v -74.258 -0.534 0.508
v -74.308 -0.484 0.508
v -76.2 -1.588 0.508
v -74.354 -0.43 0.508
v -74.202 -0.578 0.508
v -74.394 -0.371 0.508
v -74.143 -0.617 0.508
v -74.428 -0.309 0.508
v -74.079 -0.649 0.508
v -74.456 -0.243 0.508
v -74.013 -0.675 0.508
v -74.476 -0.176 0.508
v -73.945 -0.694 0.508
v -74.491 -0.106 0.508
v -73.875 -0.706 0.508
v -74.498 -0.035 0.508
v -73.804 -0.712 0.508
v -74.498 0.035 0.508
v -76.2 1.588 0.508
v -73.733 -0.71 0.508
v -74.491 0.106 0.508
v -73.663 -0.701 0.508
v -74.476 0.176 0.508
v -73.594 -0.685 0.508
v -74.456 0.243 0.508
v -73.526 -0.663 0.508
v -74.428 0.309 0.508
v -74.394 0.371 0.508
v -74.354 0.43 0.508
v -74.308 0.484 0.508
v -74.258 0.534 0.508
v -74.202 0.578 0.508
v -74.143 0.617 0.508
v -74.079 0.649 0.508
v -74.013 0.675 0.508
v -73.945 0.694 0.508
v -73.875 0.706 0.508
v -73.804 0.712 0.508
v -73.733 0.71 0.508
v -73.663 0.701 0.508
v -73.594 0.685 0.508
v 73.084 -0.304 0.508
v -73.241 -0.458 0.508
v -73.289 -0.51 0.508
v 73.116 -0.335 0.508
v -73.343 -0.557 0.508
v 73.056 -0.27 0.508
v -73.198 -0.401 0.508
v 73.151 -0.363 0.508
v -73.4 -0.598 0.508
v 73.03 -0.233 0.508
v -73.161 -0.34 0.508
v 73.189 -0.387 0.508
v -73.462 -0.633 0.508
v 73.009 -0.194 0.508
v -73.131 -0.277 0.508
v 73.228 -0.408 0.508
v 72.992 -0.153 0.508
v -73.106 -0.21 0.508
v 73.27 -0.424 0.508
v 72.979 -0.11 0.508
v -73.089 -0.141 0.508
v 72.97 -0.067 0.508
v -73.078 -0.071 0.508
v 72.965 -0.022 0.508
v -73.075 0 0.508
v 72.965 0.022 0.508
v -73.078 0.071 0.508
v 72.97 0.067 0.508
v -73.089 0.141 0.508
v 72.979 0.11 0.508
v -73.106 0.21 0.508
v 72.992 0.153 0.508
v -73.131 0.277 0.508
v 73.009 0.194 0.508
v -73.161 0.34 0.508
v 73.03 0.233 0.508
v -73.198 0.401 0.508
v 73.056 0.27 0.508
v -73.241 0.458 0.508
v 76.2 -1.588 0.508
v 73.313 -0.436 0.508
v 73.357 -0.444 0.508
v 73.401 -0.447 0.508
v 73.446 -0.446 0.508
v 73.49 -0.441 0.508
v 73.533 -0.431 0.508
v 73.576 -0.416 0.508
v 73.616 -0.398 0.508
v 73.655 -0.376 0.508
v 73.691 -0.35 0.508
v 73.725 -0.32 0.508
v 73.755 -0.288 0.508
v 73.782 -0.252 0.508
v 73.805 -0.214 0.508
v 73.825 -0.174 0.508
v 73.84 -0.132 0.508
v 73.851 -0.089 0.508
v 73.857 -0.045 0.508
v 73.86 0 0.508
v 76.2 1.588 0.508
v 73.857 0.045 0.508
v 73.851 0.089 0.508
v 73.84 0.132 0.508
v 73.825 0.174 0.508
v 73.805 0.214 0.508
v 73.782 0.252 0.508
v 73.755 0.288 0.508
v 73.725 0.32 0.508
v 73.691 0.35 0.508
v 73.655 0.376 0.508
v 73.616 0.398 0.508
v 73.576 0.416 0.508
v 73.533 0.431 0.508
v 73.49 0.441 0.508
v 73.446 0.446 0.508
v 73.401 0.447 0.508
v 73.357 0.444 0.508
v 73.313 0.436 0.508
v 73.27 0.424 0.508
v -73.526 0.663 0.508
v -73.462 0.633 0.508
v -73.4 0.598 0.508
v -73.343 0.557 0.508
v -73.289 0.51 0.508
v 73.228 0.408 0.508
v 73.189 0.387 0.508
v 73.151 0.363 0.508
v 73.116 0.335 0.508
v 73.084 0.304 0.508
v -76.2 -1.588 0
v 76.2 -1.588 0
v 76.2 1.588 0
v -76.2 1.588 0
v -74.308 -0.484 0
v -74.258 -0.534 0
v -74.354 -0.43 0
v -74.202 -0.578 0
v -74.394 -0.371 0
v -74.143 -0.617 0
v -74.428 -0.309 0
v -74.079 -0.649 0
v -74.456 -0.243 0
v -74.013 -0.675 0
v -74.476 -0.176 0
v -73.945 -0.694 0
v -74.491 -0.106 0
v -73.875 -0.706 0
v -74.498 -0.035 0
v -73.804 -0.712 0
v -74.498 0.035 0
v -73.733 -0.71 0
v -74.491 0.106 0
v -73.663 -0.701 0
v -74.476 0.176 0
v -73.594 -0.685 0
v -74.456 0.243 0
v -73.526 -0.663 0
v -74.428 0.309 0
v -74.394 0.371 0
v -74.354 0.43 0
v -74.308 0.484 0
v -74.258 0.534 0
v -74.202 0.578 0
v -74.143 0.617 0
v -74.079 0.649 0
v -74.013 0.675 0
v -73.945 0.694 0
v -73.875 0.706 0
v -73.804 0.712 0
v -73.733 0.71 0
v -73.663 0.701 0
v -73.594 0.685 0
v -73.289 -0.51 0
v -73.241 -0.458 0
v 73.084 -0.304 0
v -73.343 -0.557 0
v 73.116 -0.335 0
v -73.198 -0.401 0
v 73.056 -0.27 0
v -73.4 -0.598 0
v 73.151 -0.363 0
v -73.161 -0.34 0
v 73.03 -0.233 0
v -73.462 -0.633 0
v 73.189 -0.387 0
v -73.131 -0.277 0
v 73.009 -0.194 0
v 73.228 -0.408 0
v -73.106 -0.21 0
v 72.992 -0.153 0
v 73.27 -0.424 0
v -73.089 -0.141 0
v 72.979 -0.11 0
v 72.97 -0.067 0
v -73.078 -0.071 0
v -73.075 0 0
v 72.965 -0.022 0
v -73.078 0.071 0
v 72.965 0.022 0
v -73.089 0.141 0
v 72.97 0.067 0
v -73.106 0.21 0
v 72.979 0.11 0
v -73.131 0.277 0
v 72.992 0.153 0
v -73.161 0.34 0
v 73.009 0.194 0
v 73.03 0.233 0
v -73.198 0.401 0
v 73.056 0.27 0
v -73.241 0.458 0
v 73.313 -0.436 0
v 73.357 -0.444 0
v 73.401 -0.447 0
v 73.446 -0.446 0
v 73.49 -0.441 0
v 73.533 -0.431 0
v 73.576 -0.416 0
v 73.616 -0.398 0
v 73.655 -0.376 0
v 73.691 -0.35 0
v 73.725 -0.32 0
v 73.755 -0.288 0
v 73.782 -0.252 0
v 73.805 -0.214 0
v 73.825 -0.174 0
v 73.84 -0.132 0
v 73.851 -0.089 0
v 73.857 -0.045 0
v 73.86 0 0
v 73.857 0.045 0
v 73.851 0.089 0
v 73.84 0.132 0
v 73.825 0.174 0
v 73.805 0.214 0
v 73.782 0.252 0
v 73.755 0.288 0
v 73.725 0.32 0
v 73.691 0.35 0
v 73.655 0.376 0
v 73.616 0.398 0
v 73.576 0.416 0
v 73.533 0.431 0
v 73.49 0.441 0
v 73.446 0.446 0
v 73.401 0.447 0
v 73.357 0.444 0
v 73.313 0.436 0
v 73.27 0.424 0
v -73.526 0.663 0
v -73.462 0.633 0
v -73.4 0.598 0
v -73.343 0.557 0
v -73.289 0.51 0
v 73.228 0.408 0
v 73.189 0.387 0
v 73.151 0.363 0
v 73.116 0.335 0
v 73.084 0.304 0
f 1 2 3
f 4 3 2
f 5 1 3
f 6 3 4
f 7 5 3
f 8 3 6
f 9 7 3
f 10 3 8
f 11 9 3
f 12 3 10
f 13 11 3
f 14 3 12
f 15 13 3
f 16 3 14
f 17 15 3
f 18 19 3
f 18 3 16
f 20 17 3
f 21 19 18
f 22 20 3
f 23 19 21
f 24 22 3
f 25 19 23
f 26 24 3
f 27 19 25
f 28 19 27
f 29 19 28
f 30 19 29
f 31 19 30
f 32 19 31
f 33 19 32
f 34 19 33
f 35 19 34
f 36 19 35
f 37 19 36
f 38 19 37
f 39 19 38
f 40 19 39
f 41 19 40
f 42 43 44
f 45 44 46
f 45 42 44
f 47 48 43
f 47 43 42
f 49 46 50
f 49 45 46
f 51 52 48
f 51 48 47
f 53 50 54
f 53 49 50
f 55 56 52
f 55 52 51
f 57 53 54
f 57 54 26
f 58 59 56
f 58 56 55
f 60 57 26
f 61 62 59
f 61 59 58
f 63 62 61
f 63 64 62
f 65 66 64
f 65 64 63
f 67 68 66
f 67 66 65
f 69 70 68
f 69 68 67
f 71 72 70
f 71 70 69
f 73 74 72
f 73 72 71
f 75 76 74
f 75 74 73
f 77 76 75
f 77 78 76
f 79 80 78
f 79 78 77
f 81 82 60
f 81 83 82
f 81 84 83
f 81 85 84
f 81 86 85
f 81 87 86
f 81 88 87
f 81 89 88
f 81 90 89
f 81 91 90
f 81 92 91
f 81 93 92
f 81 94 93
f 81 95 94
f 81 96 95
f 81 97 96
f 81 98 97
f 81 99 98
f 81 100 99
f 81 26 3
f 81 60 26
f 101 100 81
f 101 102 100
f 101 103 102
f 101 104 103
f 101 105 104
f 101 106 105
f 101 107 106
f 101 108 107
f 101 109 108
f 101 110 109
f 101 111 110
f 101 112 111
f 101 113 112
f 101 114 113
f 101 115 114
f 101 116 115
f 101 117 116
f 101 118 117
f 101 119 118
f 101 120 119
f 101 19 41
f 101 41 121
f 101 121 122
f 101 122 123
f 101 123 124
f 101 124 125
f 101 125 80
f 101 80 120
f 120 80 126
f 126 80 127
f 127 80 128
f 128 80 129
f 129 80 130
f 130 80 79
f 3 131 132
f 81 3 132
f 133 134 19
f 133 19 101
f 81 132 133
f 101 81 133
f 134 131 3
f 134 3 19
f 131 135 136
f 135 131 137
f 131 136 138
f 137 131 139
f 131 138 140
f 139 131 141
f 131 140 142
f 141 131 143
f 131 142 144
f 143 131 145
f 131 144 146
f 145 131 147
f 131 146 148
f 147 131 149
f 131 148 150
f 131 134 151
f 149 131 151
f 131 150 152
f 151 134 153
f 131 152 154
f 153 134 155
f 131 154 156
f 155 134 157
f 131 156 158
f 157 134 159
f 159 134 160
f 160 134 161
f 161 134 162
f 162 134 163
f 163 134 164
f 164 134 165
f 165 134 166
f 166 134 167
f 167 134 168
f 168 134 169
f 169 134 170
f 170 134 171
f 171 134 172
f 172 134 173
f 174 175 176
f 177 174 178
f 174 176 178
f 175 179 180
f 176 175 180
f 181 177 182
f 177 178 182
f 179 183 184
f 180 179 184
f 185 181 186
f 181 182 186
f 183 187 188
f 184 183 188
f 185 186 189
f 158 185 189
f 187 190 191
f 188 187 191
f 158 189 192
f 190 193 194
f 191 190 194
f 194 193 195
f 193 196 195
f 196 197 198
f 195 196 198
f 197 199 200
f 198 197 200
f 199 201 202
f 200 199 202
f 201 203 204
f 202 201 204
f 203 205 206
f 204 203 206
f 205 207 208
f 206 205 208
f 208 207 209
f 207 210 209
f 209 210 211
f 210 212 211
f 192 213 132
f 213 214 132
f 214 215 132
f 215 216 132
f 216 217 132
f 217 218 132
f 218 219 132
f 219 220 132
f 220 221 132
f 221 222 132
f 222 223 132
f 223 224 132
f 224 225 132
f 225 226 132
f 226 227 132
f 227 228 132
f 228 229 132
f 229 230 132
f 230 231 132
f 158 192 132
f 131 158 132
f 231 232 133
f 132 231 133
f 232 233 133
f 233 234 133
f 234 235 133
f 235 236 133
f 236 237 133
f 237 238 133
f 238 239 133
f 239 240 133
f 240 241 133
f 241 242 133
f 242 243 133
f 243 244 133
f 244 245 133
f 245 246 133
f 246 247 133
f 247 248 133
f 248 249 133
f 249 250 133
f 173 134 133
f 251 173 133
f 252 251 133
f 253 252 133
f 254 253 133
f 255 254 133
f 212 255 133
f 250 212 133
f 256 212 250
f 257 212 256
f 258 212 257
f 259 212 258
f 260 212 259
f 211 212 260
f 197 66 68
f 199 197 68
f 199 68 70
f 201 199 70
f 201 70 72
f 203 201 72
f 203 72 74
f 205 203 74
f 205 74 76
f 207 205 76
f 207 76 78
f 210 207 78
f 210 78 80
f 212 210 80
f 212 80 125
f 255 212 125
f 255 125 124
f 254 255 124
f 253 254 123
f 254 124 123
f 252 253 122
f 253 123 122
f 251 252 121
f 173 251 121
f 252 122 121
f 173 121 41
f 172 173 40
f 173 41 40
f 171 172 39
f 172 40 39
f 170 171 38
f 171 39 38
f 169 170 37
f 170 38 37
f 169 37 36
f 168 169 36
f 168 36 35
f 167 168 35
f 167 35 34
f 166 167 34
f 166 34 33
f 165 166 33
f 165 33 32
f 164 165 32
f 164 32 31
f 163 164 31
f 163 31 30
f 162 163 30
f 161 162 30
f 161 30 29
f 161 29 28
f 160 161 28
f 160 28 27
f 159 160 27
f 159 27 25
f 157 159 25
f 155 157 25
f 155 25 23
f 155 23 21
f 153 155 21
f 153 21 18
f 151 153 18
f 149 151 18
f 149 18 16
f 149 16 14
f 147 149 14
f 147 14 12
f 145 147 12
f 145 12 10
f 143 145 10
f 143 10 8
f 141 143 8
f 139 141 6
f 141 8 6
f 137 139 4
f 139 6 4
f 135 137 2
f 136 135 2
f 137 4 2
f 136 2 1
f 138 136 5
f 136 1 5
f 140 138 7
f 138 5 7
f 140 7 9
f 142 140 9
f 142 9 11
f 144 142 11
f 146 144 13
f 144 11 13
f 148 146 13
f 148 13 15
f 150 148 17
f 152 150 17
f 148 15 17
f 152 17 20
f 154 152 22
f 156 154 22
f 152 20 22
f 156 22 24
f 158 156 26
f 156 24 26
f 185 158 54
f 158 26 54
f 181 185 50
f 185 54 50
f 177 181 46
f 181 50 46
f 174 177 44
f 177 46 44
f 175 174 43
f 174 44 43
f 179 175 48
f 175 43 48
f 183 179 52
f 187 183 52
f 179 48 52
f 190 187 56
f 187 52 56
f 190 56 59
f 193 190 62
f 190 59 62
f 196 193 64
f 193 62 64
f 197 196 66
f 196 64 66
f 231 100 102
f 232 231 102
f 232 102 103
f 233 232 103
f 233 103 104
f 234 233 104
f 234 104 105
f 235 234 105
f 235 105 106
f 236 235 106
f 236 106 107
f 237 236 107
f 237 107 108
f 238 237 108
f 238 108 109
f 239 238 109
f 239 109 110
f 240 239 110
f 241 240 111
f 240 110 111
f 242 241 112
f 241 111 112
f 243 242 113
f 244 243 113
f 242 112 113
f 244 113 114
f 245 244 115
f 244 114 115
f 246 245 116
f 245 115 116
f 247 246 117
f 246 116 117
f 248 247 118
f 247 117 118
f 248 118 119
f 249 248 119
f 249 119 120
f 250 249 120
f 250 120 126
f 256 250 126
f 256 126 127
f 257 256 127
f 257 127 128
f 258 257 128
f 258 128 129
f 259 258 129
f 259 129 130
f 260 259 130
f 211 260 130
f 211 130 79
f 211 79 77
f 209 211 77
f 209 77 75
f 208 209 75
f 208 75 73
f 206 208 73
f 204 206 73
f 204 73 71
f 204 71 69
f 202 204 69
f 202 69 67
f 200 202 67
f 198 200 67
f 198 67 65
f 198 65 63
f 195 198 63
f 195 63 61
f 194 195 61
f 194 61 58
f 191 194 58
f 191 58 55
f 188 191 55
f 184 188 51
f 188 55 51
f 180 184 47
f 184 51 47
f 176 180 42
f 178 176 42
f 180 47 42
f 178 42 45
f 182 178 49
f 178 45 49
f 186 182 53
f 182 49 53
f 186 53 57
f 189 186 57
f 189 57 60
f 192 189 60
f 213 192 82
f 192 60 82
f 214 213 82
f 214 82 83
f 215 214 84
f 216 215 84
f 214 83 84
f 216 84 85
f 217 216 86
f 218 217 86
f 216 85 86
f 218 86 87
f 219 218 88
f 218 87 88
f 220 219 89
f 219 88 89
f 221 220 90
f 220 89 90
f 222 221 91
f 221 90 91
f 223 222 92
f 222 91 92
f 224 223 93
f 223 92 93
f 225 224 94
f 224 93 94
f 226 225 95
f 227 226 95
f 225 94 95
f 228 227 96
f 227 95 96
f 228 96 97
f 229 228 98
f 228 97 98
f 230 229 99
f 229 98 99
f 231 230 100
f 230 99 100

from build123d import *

# Parameters (mm, degrees)
F0_W     = 152.4
F0_H     = 3.175
F1_DEPTH = 0.508
F2_R     = 0.447417
F3_DEPTH = 25.4
F4_R     = 0.711893
F5_DEPTH = 25.4


with BuildPart() as f1:
    # F0 (on Top) → F1 (new body)
    with BuildSketch(Plane.XY):
        Rectangle(F0_W, F0_H)
    extrude(amount=F1_DEPTH)

    # F2 (on face) → F3 (cut)
    with BuildSketch(Plane.XY.offset(0.508)):
        with Locations((73.41224, 0)):
            Circle(F2_R)
    extrude(amount=-F3_DEPTH, mode=Mode.SUBTRACT)

    # F4 (on face) → F5 (cut)
    with BuildSketch(Plane.XY.offset(0.508)):
        with Locations((-73.786564, 0)):
            Circle(F4_R)
    extrude(amount=-F5_DEPTH, mode=Mode.SUBTRACT)


solid = f1.part
